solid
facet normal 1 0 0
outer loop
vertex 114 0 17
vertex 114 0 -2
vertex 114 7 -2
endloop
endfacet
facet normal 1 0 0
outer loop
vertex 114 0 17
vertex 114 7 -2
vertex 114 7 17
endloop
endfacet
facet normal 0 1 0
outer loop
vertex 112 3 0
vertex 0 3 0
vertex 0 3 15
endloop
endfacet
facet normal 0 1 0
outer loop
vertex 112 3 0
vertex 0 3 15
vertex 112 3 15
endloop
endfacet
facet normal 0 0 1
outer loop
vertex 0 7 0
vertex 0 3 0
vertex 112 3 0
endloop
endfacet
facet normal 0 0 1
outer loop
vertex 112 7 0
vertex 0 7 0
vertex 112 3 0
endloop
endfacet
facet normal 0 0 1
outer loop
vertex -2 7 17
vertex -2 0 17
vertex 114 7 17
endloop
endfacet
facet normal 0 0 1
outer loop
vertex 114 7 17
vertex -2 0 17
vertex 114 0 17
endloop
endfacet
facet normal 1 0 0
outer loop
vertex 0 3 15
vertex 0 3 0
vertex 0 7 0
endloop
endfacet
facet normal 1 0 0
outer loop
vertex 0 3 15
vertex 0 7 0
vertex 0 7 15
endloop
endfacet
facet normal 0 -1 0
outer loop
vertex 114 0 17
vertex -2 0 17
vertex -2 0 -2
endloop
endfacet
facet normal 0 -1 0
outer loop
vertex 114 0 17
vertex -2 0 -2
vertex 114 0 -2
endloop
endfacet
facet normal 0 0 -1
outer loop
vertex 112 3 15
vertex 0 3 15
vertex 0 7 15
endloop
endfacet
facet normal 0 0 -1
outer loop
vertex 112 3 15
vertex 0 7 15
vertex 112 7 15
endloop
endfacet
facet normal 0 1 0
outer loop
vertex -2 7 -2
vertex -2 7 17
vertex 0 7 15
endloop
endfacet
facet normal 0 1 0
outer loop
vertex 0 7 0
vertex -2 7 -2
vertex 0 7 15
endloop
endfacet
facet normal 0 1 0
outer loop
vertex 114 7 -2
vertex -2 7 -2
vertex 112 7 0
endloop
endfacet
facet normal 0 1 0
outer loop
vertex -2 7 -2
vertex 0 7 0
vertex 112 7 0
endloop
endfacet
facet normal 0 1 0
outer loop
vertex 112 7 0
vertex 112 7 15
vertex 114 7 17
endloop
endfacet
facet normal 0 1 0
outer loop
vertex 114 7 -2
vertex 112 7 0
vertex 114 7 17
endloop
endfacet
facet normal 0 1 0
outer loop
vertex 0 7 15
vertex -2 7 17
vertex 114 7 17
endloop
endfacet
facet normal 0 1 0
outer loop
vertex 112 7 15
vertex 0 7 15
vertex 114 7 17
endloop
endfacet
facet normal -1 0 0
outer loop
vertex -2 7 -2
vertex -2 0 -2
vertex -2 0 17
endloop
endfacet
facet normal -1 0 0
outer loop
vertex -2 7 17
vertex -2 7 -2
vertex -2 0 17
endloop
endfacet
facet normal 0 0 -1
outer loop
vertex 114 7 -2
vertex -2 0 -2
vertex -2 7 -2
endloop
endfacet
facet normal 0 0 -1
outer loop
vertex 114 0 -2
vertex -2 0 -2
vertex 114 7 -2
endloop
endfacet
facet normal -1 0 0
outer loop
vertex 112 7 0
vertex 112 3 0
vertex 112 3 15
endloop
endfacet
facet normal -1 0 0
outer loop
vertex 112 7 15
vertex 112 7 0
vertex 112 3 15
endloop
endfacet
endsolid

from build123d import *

# Parameters (mm, degrees)
SKETCH_1_W      = 112
SKETCH_1_H      = 15
EXTRUDE_1_DEPTH = 3
SKETCH_2_W      = 116
SKETCH_2_H      = 19
SKETCH_2_W_2    = 112
SKETCH_2_H_2    = 15
EXTRUDE_2_DEPTH = 7


with BuildPart() as part:
    # 草图1 → 凸台-拉伸1 (new body)
    with BuildSketch(Plane(origin=(0, 0, 0), x_dir=(1, 0, 0), z_dir=(0, 1, 0))):
        with Locations((56, -7.5)):
            Rectangle(SKETCH_1_W, SKETCH_1_H)
    extrude(amount=EXTRUDE_1_DEPTH)

    # 草图2 → 凸台-拉伸2 (add)
    with BuildSketch(Plane.XZ):
        with Locations((56, 7.5)):
            Rectangle(SKETCH_2_W, SKETCH_2_H)
        with Locations((56, 7.5)):
            Rectangle(SKETCH_2_W_2, SKETCH_2_H_2, mode=Mode.SUBTRACT)
    extrude(amount=-EXTRUDE_2_DEPTH)


solid = part.part
